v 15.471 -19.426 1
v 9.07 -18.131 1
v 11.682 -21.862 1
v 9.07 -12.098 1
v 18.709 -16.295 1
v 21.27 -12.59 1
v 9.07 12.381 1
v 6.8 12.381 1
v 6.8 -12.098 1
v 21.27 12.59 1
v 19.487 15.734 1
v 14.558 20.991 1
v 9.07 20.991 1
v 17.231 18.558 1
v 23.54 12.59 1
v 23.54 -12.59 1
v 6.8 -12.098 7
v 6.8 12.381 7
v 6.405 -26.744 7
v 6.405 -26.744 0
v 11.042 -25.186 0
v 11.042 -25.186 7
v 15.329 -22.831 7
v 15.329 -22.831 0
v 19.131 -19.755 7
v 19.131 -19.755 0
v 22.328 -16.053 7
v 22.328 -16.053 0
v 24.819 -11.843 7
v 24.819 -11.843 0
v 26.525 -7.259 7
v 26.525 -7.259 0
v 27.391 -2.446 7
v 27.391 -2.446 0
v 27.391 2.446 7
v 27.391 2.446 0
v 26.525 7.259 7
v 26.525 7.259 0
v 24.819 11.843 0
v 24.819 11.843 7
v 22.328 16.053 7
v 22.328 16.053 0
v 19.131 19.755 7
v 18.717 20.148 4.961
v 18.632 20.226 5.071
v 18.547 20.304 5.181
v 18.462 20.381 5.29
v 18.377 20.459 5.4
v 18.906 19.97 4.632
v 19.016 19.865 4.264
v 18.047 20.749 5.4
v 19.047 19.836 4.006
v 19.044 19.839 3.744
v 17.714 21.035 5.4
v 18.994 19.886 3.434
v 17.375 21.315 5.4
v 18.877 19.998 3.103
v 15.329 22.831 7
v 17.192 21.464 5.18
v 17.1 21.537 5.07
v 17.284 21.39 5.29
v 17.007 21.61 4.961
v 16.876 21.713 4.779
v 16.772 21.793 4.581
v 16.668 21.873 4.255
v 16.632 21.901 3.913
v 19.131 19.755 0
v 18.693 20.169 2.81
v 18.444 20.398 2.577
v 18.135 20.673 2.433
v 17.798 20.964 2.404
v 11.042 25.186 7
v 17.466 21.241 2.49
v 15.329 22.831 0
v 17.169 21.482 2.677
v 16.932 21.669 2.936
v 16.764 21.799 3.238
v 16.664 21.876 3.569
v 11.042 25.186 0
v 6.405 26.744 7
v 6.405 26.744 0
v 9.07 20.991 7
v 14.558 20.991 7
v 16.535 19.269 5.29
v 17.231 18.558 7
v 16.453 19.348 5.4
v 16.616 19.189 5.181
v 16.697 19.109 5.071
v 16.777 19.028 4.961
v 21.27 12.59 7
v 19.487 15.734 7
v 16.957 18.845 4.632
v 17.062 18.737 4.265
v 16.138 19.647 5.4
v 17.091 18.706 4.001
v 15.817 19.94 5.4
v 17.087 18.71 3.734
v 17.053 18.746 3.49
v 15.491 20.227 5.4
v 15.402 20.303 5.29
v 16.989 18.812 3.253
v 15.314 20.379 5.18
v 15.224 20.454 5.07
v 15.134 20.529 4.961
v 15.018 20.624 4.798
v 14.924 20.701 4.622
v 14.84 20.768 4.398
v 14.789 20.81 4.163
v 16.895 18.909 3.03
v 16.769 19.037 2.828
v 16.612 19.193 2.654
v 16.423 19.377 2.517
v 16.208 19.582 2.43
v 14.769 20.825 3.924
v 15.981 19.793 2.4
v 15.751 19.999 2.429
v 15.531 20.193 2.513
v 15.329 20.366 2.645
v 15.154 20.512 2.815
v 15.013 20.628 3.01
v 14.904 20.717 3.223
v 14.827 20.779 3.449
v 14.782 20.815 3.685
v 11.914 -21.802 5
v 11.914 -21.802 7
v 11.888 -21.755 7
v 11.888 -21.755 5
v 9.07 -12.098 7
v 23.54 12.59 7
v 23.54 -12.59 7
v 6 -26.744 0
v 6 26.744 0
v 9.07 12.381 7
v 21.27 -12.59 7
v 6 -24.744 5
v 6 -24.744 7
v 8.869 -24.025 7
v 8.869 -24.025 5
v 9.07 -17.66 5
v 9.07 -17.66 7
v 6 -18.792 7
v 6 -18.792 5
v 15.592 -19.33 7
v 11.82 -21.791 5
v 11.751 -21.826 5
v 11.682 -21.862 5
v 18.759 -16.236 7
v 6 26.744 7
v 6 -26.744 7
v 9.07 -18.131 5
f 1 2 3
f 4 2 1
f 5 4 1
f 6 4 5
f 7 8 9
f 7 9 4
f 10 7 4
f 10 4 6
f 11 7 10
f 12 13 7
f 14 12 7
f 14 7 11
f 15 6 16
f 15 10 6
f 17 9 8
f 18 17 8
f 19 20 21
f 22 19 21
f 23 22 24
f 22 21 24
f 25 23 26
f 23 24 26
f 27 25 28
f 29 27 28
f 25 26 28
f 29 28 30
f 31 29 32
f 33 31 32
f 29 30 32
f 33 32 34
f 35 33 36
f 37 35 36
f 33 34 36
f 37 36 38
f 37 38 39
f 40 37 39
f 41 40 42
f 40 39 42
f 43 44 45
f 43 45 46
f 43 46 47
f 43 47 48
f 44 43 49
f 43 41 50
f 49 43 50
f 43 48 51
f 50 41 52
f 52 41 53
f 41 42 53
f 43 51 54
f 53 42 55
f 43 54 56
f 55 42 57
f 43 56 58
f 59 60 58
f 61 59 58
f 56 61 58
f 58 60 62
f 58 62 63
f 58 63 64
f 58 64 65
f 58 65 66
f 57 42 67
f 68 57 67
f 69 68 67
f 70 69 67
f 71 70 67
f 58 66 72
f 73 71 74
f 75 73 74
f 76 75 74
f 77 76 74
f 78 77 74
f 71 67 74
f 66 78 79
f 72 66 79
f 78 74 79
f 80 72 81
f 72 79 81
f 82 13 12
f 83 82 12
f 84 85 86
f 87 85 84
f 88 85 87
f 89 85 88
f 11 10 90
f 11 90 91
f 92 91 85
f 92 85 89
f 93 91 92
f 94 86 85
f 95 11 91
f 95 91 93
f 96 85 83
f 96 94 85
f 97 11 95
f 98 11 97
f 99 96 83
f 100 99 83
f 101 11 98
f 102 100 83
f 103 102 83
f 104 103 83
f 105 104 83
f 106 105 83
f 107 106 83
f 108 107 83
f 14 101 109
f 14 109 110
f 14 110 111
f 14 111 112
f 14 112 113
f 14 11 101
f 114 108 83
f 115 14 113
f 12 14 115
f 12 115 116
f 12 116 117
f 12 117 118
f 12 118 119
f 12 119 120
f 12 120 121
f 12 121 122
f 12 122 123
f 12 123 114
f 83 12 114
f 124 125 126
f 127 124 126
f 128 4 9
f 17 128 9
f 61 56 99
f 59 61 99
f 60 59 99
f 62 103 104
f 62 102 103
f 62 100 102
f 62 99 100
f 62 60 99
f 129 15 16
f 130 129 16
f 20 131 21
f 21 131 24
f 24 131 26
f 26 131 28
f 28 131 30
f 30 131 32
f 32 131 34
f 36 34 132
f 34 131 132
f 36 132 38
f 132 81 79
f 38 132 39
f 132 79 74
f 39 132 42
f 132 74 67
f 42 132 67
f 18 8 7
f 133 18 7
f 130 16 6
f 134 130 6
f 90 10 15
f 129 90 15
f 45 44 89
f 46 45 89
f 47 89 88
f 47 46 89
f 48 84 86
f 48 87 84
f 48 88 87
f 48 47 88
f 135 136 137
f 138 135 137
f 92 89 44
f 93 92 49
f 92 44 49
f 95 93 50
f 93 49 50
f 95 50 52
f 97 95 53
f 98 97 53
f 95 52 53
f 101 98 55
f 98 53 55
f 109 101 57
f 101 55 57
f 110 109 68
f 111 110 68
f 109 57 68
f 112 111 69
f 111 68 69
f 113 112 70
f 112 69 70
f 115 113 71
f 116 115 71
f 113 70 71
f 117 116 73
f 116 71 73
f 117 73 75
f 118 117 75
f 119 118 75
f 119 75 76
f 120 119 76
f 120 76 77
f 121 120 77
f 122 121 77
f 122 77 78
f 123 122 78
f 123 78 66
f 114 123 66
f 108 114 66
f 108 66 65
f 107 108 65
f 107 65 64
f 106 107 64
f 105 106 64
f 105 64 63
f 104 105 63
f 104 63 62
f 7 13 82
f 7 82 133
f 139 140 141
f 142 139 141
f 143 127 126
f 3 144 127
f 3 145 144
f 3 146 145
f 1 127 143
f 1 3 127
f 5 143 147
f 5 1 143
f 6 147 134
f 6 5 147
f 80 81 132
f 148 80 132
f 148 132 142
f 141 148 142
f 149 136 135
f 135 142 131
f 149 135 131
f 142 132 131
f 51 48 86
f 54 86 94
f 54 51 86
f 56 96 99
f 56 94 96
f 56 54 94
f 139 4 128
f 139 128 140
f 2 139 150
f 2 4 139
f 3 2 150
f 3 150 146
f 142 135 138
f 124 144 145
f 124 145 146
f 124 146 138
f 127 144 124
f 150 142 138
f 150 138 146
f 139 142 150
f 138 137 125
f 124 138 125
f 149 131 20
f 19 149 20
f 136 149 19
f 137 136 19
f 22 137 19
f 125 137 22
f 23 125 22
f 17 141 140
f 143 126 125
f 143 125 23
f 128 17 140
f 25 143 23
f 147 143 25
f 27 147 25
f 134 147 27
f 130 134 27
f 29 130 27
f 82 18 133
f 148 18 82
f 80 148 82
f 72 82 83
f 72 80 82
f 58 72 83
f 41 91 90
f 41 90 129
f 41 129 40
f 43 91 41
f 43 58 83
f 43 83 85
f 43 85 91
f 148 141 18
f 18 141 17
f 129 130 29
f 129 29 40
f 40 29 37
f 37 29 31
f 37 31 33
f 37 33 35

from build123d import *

# Parameters (mm, degrees)
PAD006_DEPTH    = 7
POCKET003_DEPTH = 6.001
POCKET004_DEPTH = 12
POCKET005_DEPTH = 2


with BuildPart() as part:
    # Sketch008 → Pad006 (new body)
    with BuildSketch(Plane.XY):
        with BuildLine():
            ThreePointArc((6.40542, -26.743608), (27.5, 0), (6.40542, 26.743608))
            Line((6.40542, 26.743608), (6, 26.743608))
            Line((6, 26.743608), (6, -26.743608))
            Line((6, -26.743608), (6.40542, -26.743608))
        make_face()
    extrude(amount=PAD006_DEPTH)

    # Sketch009 → Pocket003 (cut, through all)
    with BuildSketch(Plane.XY.offset(1)):
        with BuildLine():
            Line((9.069885, 20.990567), (9.069885, 12.381273))
            Line((6.8, 12.381273), (9.069885, 12.381273))
            Line((6.8, -12.097779), (6.8, 12.381273))
            Line((9.069885, -12.097779), (6.8, -12.097779))
            Line((9.069885, -12.097779), (9.069885, -18.131377))
            Line((9.069885, -18.131377), (11.681826, -21.861614))
            ThreePointArc((11.681826, -21.861614), (17.167285, -17.940734), (21.270115, -12.59))
            Line((23.54, -12.59), (21.270115, -12.59))
            Line((23.54, 12.59), (23.54, -12.59))
            Line((21.270115, 12.59), (23.54, 12.59))
            ThreePointArc((21.270115, 12.59), (18.415103, 17.190589), (14.558075, 20.990567))
            Line((9.069885, 20.990567), (14.558075, 20.990567))
        make_face()
    extrude(amount=POCKET003_DEPTH, mode=Mode.SUBTRACT)

    # Sketch010 → Pocket004 (cut)
    with BuildSketch(Plane(origin=(25, 25, 0), x_dir=(-0.5, 0.866025, 0), z_dir=(0.866025, 0.5, 0))):
        with BuildLine():
            ThreePointArc((-1.06066, 4.96066), (0, 2.4), (1.06066, 4.96066))
            Line((0.62132, 5.4), (1.06066, 4.96066))
            Line((-0.62132, 5.4), (0.62132, 5.4))
            Line((-1.06066, 4.96066), (-0.62132, 5.4))
        make_face()
    extrude(amount=-POCKET004_DEPTH, mode=Mode.SUBTRACT)

    # Sketch011 → Pocket005 (cut)
    with BuildSketch(Plane.XY.offset(7)):
        Polygon((9.546117, -17.484219), (3.82131, -19.595547), (3.82131, -24.962748), (5.727243, -24.812279), (8.868557, -24.025229), (11.914429, -21.802042), align=None)
    extrude(amount=-POCKET005_DEPTH, mode=Mode.SUBTRACT)


solid = part.part
